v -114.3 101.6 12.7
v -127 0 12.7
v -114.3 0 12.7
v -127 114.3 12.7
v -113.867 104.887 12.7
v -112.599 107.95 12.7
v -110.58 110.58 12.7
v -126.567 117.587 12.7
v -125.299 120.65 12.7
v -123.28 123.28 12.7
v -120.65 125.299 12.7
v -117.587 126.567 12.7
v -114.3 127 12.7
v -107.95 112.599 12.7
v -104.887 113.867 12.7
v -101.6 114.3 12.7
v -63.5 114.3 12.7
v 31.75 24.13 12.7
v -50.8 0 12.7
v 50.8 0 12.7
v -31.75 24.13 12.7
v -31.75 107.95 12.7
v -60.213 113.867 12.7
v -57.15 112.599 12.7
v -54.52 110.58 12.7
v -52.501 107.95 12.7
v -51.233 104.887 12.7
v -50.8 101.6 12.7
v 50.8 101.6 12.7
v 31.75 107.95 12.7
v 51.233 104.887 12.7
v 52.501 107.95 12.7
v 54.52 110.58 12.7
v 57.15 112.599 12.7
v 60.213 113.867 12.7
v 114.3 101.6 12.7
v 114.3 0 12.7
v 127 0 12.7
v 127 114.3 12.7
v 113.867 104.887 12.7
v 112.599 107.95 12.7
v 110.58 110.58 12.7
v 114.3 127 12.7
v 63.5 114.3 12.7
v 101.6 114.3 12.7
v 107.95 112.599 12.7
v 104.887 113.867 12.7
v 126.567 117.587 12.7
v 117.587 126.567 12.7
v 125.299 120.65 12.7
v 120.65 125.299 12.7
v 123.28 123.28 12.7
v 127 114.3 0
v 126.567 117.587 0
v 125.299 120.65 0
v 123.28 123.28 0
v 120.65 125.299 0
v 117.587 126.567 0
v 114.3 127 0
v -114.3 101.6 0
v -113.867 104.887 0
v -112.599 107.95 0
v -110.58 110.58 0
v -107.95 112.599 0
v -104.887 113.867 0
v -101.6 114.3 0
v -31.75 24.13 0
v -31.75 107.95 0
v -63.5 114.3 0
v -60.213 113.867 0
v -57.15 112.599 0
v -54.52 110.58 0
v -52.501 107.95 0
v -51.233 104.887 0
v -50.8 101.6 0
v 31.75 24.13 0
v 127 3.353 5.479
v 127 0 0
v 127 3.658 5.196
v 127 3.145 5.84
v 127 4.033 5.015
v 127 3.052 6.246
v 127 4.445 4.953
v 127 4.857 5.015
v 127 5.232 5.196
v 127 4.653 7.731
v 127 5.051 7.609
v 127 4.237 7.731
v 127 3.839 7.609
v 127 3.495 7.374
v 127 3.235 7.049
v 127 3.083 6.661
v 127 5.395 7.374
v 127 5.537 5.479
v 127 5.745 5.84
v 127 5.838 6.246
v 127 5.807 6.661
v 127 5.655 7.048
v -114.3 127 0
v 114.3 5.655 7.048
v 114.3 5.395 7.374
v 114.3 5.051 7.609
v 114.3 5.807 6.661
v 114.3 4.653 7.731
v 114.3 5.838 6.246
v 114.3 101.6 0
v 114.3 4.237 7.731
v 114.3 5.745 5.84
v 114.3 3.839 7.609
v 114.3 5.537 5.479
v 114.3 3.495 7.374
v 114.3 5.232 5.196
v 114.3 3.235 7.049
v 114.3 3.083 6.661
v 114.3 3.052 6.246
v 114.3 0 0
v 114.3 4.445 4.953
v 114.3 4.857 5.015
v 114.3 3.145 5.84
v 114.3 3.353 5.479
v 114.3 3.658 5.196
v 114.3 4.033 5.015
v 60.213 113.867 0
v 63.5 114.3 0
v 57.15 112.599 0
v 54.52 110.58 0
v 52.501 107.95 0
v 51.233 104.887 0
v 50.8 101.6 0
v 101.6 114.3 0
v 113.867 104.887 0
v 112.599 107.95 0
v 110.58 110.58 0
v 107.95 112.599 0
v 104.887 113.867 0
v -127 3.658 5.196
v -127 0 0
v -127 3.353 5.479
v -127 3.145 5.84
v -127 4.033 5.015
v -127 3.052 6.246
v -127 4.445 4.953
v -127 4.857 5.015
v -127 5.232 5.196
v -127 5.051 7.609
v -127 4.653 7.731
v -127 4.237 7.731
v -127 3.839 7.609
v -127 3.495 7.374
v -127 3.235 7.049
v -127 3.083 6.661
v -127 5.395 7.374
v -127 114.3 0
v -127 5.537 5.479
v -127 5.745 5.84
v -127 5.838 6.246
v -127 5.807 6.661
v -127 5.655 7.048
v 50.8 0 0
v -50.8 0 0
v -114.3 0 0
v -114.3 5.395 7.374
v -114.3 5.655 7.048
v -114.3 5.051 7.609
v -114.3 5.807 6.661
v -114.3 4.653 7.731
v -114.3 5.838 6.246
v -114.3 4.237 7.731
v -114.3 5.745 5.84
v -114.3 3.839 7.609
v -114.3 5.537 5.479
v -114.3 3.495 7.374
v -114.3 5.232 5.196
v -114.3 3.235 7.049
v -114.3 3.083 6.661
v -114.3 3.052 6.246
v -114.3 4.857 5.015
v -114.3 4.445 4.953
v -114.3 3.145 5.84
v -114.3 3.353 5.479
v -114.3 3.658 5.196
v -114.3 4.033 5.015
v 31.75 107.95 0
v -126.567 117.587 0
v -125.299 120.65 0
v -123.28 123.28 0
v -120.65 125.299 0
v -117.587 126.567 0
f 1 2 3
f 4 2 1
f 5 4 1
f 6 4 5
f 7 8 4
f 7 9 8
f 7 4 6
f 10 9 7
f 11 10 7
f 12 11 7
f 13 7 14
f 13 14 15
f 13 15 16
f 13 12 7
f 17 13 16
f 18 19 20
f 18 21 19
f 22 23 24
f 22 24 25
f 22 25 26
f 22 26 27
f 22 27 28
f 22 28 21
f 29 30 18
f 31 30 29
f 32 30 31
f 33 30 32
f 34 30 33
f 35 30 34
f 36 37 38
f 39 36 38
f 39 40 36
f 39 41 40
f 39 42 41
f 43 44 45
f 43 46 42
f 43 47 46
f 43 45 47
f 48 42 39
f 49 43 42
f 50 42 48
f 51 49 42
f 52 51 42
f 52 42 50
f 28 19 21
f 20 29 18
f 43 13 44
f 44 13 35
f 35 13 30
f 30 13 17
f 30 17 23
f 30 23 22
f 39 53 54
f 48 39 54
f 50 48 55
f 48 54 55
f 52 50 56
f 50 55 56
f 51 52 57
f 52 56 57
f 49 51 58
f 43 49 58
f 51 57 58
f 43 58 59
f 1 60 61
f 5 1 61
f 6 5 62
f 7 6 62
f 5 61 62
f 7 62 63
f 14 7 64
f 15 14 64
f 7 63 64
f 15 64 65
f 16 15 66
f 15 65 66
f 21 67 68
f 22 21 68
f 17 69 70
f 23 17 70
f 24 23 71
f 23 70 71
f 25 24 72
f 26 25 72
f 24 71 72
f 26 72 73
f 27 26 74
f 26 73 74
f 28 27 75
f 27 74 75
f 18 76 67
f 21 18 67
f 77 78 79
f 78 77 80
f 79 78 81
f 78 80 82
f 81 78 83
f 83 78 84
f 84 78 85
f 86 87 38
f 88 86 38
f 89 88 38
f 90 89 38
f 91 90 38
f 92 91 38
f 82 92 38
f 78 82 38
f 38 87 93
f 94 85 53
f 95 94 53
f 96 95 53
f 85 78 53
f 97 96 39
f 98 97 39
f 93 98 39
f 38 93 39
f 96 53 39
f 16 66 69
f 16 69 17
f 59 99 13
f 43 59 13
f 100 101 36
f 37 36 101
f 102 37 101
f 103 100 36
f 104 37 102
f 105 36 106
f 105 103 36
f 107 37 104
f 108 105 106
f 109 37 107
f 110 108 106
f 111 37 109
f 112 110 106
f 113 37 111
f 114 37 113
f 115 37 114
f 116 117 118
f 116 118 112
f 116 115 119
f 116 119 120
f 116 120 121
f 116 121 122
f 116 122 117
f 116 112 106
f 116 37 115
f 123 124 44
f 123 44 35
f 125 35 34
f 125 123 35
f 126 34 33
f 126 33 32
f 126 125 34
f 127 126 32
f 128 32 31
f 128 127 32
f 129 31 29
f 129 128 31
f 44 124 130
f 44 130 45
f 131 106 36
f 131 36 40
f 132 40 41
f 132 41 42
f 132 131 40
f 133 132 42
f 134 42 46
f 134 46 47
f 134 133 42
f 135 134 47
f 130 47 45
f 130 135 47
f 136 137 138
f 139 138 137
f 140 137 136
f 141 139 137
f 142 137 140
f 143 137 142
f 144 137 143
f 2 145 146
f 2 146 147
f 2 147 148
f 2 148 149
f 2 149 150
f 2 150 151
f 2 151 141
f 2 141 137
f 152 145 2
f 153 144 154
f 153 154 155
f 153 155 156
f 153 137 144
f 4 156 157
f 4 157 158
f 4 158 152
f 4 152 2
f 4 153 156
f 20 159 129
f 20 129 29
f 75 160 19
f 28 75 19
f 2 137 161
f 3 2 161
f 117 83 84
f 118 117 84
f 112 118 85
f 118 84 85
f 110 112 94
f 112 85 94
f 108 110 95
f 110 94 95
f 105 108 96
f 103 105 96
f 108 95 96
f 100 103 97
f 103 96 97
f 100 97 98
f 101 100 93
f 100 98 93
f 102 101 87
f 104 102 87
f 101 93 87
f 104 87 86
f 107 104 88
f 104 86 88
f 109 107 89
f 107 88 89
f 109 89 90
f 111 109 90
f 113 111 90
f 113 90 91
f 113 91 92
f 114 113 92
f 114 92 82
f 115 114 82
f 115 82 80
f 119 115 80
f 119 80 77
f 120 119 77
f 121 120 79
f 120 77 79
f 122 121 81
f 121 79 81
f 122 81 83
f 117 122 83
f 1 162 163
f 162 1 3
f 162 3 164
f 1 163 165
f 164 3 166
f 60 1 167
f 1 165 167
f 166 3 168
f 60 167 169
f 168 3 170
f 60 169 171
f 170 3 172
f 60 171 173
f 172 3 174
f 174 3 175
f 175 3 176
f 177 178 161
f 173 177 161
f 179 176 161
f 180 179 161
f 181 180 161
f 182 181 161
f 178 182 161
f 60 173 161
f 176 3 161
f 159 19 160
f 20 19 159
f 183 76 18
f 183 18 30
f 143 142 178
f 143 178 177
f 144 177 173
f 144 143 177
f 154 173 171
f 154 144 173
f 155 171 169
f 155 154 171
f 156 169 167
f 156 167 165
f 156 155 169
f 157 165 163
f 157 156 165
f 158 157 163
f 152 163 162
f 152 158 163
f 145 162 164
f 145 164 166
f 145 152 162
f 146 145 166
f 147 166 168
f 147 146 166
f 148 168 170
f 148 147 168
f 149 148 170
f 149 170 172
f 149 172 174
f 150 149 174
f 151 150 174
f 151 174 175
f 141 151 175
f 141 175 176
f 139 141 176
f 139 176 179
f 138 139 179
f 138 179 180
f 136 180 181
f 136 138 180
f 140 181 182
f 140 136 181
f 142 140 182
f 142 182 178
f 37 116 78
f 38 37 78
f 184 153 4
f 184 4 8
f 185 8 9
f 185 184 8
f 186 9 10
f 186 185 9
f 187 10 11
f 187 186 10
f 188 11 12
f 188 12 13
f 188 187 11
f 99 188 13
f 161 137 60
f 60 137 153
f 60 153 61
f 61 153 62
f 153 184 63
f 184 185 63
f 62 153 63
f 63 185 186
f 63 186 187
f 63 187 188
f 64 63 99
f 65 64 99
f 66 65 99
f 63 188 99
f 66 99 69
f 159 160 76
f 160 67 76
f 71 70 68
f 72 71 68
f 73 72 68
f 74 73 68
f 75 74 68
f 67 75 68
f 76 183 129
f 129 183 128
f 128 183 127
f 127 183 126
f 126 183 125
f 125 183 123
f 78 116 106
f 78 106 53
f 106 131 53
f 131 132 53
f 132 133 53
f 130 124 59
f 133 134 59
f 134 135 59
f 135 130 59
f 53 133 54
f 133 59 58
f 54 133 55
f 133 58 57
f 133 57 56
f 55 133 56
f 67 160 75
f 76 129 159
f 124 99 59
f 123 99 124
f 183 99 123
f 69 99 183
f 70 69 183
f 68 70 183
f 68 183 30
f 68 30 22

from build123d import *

# Parameters (mm, degrees)
SKETCH1_W             = 12.7
SKETCH1_H             = 12.7
BOSS_EXTRUDE1_DEPTH   = 114.3
BOSS_EXTRUDE1_2_DEPTH = 114.3
SKETCH2_W             = 12.7
SKETCH2_H             = 12.7
BOSS_EXTRUDE2_DEPTH   = 254
SKETCH3_W             = 101.6
SKETCH3_H             = 12.7
BOSS_EXTRUDE3_DEPTH   = 114.3
SKETCH4_R             = 1.397
CUT_EXTRUDE1_DEPTH    = 12.7
BOSS_EXTRUDE4_DEPTH   = 12.7
CUT_EXTRUDE2_DEPTH    = 12.7
SKETCH7_W             = 63.5
SKETCH7_H             = 83.82
CUT_EXTRUDE3_DEPTH    = 12.7


with BuildPart() as part:
    # Sketch1 → Boss-Extrude1 (new body)
    with BuildSketch(Plane(origin=(0, 0, 0), x_dir=(1, 0, 0), z_dir=(0, 1, 0))):
        with Locations((-120.65, -6.35)):
            Rectangle(SKETCH1_W, SKETCH1_H)
    extrude(amount=BOSS_EXTRUDE1_DEPTH)



with BuildPart() as body_2:
    # Sketch1 → Boss-Extrude1 2 (new body)
    with BuildSketch(Plane(origin=(0, 0, 0), x_dir=(1, 0, 0), z_dir=(0, 1, 0))):
        with Locations((120.65, -6.35)):
            Rectangle(SKETCH1_W, SKETCH1_H)
    extrude(amount=BOSS_EXTRUDE1_2_DEPTH)


with BuildPart() as part_1:
    add(part.part)

    add(body_2.part)  # Boss-Extrude2 merges body 2
    # Sketch2 → Boss-Extrude2 (add)
    with BuildSketch(Plane.ZY.offset(127)):
        with Locations((6.35, 120.65)):
            Rectangle(SKETCH2_W, SKETCH2_H)
    extrude(amount=-BOSS_EXTRUDE2_DEPTH)

    # Sketch3 → Boss-Extrude3 (add)
    with BuildSketch(Plane.XZ.offset(-114.3)):
        with Locations((0, 6.35)):
            Rectangle(SKETCH3_W, SKETCH3_H)
    extrude(amount=BOSS_EXTRUDE3_DEPTH)

    # Sketch4 → Cut-Extrude1 (cut)
    with BuildSketch(Plane(origin=(127, 0, 0), x_dir=(0, 0, -1), z_dir=(1, 0, 0))):
        with Locations((-6.35, 4.445)):
            Circle(SKETCH4_R)
    cut_extrude1 = extrude(amount=-CUT_EXTRUDE1_DEPTH, mode=Mode.SUBTRACT)

    # Mirror1: Cut-Extrude1 across plane
    add(cut_extrude1.mirror(Plane(origin=(0, 0, 0), x_dir=(0, 0, 1), z_dir=(1, 0, 0))), mode=Mode.SUBTRACT)

    # Sketch5 → Boss-Extrude4 (add)
    with BuildSketch(Plane(origin=(0, 0, 0), x_dir=(-1, 0, 0), z_dir=(0, 0, -1))):
        with BuildLine():
            Line((-114.3, 114.3), (-114.3, 101.6))
            ThreePointArc((-114.3, 101.6), (-110.580256121, 110.580256121), (-101.6, 114.3))
            Line((-101.6, 114.3), (-114.3, 114.3))
        make_face()
        with BuildLine():
            Line((-50.8, 114.3), (-63.5, 114.3))
            ThreePointArc((-63.5, 114.3), (-54.519743879, 110.580256121), (-50.8, 101.6))
            Line((-50.8, 101.6), (-50.8, 114.3))
        make_face()
    boss_extrude4 = extrude(amount=-BOSS_EXTRUDE4_DEPTH)

    # Mirror2: Boss-Extrude4 across plane
    add(boss_extrude4.mirror(Plane(origin=(0, 0, 0), x_dir=(0, 0, 1), z_dir=(1, 0, 0))))

    # Sketch6 → Cut-Extrude2 (cut)
    with BuildSketch(Plane(origin=(0, 0, 0), x_dir=(-1, 0, 0), z_dir=(0, 0, -1))):
        with BuildLine():
            Line((-127, 127), (-127, 114.3))
            ThreePointArc((-127, 114.3), (-123.280256121, 123.280256121), (-114.3, 127))
            Line((-114.3, 127), (-127, 127))
        make_face()
    cut_extrude2 = extrude(amount=-CUT_EXTRUDE2_DEPTH, mode=Mode.SUBTRACT)

    # Mirror3: Cut-Extrude2 across plane
    add(cut_extrude2.mirror(Plane(origin=(0, 0, 0), x_dir=(0, 0, 1), z_dir=(1, 0, 0))), mode=Mode.SUBTRACT)

    # Sketch7 → Cut-Extrude3 (cut)
    with BuildSketch(Plane(origin=(0, 0, 0), x_dir=(-1, 0, 0), z_dir=(0, 0, -1))):
        with Locations((0, 66.04)):
            Rectangle(SKETCH7_W, SKETCH7_H)
    extrude(amount=-CUT_EXTRUDE3_DEPTH, mode=Mode.SUBTRACT)


solid = part_1.part
